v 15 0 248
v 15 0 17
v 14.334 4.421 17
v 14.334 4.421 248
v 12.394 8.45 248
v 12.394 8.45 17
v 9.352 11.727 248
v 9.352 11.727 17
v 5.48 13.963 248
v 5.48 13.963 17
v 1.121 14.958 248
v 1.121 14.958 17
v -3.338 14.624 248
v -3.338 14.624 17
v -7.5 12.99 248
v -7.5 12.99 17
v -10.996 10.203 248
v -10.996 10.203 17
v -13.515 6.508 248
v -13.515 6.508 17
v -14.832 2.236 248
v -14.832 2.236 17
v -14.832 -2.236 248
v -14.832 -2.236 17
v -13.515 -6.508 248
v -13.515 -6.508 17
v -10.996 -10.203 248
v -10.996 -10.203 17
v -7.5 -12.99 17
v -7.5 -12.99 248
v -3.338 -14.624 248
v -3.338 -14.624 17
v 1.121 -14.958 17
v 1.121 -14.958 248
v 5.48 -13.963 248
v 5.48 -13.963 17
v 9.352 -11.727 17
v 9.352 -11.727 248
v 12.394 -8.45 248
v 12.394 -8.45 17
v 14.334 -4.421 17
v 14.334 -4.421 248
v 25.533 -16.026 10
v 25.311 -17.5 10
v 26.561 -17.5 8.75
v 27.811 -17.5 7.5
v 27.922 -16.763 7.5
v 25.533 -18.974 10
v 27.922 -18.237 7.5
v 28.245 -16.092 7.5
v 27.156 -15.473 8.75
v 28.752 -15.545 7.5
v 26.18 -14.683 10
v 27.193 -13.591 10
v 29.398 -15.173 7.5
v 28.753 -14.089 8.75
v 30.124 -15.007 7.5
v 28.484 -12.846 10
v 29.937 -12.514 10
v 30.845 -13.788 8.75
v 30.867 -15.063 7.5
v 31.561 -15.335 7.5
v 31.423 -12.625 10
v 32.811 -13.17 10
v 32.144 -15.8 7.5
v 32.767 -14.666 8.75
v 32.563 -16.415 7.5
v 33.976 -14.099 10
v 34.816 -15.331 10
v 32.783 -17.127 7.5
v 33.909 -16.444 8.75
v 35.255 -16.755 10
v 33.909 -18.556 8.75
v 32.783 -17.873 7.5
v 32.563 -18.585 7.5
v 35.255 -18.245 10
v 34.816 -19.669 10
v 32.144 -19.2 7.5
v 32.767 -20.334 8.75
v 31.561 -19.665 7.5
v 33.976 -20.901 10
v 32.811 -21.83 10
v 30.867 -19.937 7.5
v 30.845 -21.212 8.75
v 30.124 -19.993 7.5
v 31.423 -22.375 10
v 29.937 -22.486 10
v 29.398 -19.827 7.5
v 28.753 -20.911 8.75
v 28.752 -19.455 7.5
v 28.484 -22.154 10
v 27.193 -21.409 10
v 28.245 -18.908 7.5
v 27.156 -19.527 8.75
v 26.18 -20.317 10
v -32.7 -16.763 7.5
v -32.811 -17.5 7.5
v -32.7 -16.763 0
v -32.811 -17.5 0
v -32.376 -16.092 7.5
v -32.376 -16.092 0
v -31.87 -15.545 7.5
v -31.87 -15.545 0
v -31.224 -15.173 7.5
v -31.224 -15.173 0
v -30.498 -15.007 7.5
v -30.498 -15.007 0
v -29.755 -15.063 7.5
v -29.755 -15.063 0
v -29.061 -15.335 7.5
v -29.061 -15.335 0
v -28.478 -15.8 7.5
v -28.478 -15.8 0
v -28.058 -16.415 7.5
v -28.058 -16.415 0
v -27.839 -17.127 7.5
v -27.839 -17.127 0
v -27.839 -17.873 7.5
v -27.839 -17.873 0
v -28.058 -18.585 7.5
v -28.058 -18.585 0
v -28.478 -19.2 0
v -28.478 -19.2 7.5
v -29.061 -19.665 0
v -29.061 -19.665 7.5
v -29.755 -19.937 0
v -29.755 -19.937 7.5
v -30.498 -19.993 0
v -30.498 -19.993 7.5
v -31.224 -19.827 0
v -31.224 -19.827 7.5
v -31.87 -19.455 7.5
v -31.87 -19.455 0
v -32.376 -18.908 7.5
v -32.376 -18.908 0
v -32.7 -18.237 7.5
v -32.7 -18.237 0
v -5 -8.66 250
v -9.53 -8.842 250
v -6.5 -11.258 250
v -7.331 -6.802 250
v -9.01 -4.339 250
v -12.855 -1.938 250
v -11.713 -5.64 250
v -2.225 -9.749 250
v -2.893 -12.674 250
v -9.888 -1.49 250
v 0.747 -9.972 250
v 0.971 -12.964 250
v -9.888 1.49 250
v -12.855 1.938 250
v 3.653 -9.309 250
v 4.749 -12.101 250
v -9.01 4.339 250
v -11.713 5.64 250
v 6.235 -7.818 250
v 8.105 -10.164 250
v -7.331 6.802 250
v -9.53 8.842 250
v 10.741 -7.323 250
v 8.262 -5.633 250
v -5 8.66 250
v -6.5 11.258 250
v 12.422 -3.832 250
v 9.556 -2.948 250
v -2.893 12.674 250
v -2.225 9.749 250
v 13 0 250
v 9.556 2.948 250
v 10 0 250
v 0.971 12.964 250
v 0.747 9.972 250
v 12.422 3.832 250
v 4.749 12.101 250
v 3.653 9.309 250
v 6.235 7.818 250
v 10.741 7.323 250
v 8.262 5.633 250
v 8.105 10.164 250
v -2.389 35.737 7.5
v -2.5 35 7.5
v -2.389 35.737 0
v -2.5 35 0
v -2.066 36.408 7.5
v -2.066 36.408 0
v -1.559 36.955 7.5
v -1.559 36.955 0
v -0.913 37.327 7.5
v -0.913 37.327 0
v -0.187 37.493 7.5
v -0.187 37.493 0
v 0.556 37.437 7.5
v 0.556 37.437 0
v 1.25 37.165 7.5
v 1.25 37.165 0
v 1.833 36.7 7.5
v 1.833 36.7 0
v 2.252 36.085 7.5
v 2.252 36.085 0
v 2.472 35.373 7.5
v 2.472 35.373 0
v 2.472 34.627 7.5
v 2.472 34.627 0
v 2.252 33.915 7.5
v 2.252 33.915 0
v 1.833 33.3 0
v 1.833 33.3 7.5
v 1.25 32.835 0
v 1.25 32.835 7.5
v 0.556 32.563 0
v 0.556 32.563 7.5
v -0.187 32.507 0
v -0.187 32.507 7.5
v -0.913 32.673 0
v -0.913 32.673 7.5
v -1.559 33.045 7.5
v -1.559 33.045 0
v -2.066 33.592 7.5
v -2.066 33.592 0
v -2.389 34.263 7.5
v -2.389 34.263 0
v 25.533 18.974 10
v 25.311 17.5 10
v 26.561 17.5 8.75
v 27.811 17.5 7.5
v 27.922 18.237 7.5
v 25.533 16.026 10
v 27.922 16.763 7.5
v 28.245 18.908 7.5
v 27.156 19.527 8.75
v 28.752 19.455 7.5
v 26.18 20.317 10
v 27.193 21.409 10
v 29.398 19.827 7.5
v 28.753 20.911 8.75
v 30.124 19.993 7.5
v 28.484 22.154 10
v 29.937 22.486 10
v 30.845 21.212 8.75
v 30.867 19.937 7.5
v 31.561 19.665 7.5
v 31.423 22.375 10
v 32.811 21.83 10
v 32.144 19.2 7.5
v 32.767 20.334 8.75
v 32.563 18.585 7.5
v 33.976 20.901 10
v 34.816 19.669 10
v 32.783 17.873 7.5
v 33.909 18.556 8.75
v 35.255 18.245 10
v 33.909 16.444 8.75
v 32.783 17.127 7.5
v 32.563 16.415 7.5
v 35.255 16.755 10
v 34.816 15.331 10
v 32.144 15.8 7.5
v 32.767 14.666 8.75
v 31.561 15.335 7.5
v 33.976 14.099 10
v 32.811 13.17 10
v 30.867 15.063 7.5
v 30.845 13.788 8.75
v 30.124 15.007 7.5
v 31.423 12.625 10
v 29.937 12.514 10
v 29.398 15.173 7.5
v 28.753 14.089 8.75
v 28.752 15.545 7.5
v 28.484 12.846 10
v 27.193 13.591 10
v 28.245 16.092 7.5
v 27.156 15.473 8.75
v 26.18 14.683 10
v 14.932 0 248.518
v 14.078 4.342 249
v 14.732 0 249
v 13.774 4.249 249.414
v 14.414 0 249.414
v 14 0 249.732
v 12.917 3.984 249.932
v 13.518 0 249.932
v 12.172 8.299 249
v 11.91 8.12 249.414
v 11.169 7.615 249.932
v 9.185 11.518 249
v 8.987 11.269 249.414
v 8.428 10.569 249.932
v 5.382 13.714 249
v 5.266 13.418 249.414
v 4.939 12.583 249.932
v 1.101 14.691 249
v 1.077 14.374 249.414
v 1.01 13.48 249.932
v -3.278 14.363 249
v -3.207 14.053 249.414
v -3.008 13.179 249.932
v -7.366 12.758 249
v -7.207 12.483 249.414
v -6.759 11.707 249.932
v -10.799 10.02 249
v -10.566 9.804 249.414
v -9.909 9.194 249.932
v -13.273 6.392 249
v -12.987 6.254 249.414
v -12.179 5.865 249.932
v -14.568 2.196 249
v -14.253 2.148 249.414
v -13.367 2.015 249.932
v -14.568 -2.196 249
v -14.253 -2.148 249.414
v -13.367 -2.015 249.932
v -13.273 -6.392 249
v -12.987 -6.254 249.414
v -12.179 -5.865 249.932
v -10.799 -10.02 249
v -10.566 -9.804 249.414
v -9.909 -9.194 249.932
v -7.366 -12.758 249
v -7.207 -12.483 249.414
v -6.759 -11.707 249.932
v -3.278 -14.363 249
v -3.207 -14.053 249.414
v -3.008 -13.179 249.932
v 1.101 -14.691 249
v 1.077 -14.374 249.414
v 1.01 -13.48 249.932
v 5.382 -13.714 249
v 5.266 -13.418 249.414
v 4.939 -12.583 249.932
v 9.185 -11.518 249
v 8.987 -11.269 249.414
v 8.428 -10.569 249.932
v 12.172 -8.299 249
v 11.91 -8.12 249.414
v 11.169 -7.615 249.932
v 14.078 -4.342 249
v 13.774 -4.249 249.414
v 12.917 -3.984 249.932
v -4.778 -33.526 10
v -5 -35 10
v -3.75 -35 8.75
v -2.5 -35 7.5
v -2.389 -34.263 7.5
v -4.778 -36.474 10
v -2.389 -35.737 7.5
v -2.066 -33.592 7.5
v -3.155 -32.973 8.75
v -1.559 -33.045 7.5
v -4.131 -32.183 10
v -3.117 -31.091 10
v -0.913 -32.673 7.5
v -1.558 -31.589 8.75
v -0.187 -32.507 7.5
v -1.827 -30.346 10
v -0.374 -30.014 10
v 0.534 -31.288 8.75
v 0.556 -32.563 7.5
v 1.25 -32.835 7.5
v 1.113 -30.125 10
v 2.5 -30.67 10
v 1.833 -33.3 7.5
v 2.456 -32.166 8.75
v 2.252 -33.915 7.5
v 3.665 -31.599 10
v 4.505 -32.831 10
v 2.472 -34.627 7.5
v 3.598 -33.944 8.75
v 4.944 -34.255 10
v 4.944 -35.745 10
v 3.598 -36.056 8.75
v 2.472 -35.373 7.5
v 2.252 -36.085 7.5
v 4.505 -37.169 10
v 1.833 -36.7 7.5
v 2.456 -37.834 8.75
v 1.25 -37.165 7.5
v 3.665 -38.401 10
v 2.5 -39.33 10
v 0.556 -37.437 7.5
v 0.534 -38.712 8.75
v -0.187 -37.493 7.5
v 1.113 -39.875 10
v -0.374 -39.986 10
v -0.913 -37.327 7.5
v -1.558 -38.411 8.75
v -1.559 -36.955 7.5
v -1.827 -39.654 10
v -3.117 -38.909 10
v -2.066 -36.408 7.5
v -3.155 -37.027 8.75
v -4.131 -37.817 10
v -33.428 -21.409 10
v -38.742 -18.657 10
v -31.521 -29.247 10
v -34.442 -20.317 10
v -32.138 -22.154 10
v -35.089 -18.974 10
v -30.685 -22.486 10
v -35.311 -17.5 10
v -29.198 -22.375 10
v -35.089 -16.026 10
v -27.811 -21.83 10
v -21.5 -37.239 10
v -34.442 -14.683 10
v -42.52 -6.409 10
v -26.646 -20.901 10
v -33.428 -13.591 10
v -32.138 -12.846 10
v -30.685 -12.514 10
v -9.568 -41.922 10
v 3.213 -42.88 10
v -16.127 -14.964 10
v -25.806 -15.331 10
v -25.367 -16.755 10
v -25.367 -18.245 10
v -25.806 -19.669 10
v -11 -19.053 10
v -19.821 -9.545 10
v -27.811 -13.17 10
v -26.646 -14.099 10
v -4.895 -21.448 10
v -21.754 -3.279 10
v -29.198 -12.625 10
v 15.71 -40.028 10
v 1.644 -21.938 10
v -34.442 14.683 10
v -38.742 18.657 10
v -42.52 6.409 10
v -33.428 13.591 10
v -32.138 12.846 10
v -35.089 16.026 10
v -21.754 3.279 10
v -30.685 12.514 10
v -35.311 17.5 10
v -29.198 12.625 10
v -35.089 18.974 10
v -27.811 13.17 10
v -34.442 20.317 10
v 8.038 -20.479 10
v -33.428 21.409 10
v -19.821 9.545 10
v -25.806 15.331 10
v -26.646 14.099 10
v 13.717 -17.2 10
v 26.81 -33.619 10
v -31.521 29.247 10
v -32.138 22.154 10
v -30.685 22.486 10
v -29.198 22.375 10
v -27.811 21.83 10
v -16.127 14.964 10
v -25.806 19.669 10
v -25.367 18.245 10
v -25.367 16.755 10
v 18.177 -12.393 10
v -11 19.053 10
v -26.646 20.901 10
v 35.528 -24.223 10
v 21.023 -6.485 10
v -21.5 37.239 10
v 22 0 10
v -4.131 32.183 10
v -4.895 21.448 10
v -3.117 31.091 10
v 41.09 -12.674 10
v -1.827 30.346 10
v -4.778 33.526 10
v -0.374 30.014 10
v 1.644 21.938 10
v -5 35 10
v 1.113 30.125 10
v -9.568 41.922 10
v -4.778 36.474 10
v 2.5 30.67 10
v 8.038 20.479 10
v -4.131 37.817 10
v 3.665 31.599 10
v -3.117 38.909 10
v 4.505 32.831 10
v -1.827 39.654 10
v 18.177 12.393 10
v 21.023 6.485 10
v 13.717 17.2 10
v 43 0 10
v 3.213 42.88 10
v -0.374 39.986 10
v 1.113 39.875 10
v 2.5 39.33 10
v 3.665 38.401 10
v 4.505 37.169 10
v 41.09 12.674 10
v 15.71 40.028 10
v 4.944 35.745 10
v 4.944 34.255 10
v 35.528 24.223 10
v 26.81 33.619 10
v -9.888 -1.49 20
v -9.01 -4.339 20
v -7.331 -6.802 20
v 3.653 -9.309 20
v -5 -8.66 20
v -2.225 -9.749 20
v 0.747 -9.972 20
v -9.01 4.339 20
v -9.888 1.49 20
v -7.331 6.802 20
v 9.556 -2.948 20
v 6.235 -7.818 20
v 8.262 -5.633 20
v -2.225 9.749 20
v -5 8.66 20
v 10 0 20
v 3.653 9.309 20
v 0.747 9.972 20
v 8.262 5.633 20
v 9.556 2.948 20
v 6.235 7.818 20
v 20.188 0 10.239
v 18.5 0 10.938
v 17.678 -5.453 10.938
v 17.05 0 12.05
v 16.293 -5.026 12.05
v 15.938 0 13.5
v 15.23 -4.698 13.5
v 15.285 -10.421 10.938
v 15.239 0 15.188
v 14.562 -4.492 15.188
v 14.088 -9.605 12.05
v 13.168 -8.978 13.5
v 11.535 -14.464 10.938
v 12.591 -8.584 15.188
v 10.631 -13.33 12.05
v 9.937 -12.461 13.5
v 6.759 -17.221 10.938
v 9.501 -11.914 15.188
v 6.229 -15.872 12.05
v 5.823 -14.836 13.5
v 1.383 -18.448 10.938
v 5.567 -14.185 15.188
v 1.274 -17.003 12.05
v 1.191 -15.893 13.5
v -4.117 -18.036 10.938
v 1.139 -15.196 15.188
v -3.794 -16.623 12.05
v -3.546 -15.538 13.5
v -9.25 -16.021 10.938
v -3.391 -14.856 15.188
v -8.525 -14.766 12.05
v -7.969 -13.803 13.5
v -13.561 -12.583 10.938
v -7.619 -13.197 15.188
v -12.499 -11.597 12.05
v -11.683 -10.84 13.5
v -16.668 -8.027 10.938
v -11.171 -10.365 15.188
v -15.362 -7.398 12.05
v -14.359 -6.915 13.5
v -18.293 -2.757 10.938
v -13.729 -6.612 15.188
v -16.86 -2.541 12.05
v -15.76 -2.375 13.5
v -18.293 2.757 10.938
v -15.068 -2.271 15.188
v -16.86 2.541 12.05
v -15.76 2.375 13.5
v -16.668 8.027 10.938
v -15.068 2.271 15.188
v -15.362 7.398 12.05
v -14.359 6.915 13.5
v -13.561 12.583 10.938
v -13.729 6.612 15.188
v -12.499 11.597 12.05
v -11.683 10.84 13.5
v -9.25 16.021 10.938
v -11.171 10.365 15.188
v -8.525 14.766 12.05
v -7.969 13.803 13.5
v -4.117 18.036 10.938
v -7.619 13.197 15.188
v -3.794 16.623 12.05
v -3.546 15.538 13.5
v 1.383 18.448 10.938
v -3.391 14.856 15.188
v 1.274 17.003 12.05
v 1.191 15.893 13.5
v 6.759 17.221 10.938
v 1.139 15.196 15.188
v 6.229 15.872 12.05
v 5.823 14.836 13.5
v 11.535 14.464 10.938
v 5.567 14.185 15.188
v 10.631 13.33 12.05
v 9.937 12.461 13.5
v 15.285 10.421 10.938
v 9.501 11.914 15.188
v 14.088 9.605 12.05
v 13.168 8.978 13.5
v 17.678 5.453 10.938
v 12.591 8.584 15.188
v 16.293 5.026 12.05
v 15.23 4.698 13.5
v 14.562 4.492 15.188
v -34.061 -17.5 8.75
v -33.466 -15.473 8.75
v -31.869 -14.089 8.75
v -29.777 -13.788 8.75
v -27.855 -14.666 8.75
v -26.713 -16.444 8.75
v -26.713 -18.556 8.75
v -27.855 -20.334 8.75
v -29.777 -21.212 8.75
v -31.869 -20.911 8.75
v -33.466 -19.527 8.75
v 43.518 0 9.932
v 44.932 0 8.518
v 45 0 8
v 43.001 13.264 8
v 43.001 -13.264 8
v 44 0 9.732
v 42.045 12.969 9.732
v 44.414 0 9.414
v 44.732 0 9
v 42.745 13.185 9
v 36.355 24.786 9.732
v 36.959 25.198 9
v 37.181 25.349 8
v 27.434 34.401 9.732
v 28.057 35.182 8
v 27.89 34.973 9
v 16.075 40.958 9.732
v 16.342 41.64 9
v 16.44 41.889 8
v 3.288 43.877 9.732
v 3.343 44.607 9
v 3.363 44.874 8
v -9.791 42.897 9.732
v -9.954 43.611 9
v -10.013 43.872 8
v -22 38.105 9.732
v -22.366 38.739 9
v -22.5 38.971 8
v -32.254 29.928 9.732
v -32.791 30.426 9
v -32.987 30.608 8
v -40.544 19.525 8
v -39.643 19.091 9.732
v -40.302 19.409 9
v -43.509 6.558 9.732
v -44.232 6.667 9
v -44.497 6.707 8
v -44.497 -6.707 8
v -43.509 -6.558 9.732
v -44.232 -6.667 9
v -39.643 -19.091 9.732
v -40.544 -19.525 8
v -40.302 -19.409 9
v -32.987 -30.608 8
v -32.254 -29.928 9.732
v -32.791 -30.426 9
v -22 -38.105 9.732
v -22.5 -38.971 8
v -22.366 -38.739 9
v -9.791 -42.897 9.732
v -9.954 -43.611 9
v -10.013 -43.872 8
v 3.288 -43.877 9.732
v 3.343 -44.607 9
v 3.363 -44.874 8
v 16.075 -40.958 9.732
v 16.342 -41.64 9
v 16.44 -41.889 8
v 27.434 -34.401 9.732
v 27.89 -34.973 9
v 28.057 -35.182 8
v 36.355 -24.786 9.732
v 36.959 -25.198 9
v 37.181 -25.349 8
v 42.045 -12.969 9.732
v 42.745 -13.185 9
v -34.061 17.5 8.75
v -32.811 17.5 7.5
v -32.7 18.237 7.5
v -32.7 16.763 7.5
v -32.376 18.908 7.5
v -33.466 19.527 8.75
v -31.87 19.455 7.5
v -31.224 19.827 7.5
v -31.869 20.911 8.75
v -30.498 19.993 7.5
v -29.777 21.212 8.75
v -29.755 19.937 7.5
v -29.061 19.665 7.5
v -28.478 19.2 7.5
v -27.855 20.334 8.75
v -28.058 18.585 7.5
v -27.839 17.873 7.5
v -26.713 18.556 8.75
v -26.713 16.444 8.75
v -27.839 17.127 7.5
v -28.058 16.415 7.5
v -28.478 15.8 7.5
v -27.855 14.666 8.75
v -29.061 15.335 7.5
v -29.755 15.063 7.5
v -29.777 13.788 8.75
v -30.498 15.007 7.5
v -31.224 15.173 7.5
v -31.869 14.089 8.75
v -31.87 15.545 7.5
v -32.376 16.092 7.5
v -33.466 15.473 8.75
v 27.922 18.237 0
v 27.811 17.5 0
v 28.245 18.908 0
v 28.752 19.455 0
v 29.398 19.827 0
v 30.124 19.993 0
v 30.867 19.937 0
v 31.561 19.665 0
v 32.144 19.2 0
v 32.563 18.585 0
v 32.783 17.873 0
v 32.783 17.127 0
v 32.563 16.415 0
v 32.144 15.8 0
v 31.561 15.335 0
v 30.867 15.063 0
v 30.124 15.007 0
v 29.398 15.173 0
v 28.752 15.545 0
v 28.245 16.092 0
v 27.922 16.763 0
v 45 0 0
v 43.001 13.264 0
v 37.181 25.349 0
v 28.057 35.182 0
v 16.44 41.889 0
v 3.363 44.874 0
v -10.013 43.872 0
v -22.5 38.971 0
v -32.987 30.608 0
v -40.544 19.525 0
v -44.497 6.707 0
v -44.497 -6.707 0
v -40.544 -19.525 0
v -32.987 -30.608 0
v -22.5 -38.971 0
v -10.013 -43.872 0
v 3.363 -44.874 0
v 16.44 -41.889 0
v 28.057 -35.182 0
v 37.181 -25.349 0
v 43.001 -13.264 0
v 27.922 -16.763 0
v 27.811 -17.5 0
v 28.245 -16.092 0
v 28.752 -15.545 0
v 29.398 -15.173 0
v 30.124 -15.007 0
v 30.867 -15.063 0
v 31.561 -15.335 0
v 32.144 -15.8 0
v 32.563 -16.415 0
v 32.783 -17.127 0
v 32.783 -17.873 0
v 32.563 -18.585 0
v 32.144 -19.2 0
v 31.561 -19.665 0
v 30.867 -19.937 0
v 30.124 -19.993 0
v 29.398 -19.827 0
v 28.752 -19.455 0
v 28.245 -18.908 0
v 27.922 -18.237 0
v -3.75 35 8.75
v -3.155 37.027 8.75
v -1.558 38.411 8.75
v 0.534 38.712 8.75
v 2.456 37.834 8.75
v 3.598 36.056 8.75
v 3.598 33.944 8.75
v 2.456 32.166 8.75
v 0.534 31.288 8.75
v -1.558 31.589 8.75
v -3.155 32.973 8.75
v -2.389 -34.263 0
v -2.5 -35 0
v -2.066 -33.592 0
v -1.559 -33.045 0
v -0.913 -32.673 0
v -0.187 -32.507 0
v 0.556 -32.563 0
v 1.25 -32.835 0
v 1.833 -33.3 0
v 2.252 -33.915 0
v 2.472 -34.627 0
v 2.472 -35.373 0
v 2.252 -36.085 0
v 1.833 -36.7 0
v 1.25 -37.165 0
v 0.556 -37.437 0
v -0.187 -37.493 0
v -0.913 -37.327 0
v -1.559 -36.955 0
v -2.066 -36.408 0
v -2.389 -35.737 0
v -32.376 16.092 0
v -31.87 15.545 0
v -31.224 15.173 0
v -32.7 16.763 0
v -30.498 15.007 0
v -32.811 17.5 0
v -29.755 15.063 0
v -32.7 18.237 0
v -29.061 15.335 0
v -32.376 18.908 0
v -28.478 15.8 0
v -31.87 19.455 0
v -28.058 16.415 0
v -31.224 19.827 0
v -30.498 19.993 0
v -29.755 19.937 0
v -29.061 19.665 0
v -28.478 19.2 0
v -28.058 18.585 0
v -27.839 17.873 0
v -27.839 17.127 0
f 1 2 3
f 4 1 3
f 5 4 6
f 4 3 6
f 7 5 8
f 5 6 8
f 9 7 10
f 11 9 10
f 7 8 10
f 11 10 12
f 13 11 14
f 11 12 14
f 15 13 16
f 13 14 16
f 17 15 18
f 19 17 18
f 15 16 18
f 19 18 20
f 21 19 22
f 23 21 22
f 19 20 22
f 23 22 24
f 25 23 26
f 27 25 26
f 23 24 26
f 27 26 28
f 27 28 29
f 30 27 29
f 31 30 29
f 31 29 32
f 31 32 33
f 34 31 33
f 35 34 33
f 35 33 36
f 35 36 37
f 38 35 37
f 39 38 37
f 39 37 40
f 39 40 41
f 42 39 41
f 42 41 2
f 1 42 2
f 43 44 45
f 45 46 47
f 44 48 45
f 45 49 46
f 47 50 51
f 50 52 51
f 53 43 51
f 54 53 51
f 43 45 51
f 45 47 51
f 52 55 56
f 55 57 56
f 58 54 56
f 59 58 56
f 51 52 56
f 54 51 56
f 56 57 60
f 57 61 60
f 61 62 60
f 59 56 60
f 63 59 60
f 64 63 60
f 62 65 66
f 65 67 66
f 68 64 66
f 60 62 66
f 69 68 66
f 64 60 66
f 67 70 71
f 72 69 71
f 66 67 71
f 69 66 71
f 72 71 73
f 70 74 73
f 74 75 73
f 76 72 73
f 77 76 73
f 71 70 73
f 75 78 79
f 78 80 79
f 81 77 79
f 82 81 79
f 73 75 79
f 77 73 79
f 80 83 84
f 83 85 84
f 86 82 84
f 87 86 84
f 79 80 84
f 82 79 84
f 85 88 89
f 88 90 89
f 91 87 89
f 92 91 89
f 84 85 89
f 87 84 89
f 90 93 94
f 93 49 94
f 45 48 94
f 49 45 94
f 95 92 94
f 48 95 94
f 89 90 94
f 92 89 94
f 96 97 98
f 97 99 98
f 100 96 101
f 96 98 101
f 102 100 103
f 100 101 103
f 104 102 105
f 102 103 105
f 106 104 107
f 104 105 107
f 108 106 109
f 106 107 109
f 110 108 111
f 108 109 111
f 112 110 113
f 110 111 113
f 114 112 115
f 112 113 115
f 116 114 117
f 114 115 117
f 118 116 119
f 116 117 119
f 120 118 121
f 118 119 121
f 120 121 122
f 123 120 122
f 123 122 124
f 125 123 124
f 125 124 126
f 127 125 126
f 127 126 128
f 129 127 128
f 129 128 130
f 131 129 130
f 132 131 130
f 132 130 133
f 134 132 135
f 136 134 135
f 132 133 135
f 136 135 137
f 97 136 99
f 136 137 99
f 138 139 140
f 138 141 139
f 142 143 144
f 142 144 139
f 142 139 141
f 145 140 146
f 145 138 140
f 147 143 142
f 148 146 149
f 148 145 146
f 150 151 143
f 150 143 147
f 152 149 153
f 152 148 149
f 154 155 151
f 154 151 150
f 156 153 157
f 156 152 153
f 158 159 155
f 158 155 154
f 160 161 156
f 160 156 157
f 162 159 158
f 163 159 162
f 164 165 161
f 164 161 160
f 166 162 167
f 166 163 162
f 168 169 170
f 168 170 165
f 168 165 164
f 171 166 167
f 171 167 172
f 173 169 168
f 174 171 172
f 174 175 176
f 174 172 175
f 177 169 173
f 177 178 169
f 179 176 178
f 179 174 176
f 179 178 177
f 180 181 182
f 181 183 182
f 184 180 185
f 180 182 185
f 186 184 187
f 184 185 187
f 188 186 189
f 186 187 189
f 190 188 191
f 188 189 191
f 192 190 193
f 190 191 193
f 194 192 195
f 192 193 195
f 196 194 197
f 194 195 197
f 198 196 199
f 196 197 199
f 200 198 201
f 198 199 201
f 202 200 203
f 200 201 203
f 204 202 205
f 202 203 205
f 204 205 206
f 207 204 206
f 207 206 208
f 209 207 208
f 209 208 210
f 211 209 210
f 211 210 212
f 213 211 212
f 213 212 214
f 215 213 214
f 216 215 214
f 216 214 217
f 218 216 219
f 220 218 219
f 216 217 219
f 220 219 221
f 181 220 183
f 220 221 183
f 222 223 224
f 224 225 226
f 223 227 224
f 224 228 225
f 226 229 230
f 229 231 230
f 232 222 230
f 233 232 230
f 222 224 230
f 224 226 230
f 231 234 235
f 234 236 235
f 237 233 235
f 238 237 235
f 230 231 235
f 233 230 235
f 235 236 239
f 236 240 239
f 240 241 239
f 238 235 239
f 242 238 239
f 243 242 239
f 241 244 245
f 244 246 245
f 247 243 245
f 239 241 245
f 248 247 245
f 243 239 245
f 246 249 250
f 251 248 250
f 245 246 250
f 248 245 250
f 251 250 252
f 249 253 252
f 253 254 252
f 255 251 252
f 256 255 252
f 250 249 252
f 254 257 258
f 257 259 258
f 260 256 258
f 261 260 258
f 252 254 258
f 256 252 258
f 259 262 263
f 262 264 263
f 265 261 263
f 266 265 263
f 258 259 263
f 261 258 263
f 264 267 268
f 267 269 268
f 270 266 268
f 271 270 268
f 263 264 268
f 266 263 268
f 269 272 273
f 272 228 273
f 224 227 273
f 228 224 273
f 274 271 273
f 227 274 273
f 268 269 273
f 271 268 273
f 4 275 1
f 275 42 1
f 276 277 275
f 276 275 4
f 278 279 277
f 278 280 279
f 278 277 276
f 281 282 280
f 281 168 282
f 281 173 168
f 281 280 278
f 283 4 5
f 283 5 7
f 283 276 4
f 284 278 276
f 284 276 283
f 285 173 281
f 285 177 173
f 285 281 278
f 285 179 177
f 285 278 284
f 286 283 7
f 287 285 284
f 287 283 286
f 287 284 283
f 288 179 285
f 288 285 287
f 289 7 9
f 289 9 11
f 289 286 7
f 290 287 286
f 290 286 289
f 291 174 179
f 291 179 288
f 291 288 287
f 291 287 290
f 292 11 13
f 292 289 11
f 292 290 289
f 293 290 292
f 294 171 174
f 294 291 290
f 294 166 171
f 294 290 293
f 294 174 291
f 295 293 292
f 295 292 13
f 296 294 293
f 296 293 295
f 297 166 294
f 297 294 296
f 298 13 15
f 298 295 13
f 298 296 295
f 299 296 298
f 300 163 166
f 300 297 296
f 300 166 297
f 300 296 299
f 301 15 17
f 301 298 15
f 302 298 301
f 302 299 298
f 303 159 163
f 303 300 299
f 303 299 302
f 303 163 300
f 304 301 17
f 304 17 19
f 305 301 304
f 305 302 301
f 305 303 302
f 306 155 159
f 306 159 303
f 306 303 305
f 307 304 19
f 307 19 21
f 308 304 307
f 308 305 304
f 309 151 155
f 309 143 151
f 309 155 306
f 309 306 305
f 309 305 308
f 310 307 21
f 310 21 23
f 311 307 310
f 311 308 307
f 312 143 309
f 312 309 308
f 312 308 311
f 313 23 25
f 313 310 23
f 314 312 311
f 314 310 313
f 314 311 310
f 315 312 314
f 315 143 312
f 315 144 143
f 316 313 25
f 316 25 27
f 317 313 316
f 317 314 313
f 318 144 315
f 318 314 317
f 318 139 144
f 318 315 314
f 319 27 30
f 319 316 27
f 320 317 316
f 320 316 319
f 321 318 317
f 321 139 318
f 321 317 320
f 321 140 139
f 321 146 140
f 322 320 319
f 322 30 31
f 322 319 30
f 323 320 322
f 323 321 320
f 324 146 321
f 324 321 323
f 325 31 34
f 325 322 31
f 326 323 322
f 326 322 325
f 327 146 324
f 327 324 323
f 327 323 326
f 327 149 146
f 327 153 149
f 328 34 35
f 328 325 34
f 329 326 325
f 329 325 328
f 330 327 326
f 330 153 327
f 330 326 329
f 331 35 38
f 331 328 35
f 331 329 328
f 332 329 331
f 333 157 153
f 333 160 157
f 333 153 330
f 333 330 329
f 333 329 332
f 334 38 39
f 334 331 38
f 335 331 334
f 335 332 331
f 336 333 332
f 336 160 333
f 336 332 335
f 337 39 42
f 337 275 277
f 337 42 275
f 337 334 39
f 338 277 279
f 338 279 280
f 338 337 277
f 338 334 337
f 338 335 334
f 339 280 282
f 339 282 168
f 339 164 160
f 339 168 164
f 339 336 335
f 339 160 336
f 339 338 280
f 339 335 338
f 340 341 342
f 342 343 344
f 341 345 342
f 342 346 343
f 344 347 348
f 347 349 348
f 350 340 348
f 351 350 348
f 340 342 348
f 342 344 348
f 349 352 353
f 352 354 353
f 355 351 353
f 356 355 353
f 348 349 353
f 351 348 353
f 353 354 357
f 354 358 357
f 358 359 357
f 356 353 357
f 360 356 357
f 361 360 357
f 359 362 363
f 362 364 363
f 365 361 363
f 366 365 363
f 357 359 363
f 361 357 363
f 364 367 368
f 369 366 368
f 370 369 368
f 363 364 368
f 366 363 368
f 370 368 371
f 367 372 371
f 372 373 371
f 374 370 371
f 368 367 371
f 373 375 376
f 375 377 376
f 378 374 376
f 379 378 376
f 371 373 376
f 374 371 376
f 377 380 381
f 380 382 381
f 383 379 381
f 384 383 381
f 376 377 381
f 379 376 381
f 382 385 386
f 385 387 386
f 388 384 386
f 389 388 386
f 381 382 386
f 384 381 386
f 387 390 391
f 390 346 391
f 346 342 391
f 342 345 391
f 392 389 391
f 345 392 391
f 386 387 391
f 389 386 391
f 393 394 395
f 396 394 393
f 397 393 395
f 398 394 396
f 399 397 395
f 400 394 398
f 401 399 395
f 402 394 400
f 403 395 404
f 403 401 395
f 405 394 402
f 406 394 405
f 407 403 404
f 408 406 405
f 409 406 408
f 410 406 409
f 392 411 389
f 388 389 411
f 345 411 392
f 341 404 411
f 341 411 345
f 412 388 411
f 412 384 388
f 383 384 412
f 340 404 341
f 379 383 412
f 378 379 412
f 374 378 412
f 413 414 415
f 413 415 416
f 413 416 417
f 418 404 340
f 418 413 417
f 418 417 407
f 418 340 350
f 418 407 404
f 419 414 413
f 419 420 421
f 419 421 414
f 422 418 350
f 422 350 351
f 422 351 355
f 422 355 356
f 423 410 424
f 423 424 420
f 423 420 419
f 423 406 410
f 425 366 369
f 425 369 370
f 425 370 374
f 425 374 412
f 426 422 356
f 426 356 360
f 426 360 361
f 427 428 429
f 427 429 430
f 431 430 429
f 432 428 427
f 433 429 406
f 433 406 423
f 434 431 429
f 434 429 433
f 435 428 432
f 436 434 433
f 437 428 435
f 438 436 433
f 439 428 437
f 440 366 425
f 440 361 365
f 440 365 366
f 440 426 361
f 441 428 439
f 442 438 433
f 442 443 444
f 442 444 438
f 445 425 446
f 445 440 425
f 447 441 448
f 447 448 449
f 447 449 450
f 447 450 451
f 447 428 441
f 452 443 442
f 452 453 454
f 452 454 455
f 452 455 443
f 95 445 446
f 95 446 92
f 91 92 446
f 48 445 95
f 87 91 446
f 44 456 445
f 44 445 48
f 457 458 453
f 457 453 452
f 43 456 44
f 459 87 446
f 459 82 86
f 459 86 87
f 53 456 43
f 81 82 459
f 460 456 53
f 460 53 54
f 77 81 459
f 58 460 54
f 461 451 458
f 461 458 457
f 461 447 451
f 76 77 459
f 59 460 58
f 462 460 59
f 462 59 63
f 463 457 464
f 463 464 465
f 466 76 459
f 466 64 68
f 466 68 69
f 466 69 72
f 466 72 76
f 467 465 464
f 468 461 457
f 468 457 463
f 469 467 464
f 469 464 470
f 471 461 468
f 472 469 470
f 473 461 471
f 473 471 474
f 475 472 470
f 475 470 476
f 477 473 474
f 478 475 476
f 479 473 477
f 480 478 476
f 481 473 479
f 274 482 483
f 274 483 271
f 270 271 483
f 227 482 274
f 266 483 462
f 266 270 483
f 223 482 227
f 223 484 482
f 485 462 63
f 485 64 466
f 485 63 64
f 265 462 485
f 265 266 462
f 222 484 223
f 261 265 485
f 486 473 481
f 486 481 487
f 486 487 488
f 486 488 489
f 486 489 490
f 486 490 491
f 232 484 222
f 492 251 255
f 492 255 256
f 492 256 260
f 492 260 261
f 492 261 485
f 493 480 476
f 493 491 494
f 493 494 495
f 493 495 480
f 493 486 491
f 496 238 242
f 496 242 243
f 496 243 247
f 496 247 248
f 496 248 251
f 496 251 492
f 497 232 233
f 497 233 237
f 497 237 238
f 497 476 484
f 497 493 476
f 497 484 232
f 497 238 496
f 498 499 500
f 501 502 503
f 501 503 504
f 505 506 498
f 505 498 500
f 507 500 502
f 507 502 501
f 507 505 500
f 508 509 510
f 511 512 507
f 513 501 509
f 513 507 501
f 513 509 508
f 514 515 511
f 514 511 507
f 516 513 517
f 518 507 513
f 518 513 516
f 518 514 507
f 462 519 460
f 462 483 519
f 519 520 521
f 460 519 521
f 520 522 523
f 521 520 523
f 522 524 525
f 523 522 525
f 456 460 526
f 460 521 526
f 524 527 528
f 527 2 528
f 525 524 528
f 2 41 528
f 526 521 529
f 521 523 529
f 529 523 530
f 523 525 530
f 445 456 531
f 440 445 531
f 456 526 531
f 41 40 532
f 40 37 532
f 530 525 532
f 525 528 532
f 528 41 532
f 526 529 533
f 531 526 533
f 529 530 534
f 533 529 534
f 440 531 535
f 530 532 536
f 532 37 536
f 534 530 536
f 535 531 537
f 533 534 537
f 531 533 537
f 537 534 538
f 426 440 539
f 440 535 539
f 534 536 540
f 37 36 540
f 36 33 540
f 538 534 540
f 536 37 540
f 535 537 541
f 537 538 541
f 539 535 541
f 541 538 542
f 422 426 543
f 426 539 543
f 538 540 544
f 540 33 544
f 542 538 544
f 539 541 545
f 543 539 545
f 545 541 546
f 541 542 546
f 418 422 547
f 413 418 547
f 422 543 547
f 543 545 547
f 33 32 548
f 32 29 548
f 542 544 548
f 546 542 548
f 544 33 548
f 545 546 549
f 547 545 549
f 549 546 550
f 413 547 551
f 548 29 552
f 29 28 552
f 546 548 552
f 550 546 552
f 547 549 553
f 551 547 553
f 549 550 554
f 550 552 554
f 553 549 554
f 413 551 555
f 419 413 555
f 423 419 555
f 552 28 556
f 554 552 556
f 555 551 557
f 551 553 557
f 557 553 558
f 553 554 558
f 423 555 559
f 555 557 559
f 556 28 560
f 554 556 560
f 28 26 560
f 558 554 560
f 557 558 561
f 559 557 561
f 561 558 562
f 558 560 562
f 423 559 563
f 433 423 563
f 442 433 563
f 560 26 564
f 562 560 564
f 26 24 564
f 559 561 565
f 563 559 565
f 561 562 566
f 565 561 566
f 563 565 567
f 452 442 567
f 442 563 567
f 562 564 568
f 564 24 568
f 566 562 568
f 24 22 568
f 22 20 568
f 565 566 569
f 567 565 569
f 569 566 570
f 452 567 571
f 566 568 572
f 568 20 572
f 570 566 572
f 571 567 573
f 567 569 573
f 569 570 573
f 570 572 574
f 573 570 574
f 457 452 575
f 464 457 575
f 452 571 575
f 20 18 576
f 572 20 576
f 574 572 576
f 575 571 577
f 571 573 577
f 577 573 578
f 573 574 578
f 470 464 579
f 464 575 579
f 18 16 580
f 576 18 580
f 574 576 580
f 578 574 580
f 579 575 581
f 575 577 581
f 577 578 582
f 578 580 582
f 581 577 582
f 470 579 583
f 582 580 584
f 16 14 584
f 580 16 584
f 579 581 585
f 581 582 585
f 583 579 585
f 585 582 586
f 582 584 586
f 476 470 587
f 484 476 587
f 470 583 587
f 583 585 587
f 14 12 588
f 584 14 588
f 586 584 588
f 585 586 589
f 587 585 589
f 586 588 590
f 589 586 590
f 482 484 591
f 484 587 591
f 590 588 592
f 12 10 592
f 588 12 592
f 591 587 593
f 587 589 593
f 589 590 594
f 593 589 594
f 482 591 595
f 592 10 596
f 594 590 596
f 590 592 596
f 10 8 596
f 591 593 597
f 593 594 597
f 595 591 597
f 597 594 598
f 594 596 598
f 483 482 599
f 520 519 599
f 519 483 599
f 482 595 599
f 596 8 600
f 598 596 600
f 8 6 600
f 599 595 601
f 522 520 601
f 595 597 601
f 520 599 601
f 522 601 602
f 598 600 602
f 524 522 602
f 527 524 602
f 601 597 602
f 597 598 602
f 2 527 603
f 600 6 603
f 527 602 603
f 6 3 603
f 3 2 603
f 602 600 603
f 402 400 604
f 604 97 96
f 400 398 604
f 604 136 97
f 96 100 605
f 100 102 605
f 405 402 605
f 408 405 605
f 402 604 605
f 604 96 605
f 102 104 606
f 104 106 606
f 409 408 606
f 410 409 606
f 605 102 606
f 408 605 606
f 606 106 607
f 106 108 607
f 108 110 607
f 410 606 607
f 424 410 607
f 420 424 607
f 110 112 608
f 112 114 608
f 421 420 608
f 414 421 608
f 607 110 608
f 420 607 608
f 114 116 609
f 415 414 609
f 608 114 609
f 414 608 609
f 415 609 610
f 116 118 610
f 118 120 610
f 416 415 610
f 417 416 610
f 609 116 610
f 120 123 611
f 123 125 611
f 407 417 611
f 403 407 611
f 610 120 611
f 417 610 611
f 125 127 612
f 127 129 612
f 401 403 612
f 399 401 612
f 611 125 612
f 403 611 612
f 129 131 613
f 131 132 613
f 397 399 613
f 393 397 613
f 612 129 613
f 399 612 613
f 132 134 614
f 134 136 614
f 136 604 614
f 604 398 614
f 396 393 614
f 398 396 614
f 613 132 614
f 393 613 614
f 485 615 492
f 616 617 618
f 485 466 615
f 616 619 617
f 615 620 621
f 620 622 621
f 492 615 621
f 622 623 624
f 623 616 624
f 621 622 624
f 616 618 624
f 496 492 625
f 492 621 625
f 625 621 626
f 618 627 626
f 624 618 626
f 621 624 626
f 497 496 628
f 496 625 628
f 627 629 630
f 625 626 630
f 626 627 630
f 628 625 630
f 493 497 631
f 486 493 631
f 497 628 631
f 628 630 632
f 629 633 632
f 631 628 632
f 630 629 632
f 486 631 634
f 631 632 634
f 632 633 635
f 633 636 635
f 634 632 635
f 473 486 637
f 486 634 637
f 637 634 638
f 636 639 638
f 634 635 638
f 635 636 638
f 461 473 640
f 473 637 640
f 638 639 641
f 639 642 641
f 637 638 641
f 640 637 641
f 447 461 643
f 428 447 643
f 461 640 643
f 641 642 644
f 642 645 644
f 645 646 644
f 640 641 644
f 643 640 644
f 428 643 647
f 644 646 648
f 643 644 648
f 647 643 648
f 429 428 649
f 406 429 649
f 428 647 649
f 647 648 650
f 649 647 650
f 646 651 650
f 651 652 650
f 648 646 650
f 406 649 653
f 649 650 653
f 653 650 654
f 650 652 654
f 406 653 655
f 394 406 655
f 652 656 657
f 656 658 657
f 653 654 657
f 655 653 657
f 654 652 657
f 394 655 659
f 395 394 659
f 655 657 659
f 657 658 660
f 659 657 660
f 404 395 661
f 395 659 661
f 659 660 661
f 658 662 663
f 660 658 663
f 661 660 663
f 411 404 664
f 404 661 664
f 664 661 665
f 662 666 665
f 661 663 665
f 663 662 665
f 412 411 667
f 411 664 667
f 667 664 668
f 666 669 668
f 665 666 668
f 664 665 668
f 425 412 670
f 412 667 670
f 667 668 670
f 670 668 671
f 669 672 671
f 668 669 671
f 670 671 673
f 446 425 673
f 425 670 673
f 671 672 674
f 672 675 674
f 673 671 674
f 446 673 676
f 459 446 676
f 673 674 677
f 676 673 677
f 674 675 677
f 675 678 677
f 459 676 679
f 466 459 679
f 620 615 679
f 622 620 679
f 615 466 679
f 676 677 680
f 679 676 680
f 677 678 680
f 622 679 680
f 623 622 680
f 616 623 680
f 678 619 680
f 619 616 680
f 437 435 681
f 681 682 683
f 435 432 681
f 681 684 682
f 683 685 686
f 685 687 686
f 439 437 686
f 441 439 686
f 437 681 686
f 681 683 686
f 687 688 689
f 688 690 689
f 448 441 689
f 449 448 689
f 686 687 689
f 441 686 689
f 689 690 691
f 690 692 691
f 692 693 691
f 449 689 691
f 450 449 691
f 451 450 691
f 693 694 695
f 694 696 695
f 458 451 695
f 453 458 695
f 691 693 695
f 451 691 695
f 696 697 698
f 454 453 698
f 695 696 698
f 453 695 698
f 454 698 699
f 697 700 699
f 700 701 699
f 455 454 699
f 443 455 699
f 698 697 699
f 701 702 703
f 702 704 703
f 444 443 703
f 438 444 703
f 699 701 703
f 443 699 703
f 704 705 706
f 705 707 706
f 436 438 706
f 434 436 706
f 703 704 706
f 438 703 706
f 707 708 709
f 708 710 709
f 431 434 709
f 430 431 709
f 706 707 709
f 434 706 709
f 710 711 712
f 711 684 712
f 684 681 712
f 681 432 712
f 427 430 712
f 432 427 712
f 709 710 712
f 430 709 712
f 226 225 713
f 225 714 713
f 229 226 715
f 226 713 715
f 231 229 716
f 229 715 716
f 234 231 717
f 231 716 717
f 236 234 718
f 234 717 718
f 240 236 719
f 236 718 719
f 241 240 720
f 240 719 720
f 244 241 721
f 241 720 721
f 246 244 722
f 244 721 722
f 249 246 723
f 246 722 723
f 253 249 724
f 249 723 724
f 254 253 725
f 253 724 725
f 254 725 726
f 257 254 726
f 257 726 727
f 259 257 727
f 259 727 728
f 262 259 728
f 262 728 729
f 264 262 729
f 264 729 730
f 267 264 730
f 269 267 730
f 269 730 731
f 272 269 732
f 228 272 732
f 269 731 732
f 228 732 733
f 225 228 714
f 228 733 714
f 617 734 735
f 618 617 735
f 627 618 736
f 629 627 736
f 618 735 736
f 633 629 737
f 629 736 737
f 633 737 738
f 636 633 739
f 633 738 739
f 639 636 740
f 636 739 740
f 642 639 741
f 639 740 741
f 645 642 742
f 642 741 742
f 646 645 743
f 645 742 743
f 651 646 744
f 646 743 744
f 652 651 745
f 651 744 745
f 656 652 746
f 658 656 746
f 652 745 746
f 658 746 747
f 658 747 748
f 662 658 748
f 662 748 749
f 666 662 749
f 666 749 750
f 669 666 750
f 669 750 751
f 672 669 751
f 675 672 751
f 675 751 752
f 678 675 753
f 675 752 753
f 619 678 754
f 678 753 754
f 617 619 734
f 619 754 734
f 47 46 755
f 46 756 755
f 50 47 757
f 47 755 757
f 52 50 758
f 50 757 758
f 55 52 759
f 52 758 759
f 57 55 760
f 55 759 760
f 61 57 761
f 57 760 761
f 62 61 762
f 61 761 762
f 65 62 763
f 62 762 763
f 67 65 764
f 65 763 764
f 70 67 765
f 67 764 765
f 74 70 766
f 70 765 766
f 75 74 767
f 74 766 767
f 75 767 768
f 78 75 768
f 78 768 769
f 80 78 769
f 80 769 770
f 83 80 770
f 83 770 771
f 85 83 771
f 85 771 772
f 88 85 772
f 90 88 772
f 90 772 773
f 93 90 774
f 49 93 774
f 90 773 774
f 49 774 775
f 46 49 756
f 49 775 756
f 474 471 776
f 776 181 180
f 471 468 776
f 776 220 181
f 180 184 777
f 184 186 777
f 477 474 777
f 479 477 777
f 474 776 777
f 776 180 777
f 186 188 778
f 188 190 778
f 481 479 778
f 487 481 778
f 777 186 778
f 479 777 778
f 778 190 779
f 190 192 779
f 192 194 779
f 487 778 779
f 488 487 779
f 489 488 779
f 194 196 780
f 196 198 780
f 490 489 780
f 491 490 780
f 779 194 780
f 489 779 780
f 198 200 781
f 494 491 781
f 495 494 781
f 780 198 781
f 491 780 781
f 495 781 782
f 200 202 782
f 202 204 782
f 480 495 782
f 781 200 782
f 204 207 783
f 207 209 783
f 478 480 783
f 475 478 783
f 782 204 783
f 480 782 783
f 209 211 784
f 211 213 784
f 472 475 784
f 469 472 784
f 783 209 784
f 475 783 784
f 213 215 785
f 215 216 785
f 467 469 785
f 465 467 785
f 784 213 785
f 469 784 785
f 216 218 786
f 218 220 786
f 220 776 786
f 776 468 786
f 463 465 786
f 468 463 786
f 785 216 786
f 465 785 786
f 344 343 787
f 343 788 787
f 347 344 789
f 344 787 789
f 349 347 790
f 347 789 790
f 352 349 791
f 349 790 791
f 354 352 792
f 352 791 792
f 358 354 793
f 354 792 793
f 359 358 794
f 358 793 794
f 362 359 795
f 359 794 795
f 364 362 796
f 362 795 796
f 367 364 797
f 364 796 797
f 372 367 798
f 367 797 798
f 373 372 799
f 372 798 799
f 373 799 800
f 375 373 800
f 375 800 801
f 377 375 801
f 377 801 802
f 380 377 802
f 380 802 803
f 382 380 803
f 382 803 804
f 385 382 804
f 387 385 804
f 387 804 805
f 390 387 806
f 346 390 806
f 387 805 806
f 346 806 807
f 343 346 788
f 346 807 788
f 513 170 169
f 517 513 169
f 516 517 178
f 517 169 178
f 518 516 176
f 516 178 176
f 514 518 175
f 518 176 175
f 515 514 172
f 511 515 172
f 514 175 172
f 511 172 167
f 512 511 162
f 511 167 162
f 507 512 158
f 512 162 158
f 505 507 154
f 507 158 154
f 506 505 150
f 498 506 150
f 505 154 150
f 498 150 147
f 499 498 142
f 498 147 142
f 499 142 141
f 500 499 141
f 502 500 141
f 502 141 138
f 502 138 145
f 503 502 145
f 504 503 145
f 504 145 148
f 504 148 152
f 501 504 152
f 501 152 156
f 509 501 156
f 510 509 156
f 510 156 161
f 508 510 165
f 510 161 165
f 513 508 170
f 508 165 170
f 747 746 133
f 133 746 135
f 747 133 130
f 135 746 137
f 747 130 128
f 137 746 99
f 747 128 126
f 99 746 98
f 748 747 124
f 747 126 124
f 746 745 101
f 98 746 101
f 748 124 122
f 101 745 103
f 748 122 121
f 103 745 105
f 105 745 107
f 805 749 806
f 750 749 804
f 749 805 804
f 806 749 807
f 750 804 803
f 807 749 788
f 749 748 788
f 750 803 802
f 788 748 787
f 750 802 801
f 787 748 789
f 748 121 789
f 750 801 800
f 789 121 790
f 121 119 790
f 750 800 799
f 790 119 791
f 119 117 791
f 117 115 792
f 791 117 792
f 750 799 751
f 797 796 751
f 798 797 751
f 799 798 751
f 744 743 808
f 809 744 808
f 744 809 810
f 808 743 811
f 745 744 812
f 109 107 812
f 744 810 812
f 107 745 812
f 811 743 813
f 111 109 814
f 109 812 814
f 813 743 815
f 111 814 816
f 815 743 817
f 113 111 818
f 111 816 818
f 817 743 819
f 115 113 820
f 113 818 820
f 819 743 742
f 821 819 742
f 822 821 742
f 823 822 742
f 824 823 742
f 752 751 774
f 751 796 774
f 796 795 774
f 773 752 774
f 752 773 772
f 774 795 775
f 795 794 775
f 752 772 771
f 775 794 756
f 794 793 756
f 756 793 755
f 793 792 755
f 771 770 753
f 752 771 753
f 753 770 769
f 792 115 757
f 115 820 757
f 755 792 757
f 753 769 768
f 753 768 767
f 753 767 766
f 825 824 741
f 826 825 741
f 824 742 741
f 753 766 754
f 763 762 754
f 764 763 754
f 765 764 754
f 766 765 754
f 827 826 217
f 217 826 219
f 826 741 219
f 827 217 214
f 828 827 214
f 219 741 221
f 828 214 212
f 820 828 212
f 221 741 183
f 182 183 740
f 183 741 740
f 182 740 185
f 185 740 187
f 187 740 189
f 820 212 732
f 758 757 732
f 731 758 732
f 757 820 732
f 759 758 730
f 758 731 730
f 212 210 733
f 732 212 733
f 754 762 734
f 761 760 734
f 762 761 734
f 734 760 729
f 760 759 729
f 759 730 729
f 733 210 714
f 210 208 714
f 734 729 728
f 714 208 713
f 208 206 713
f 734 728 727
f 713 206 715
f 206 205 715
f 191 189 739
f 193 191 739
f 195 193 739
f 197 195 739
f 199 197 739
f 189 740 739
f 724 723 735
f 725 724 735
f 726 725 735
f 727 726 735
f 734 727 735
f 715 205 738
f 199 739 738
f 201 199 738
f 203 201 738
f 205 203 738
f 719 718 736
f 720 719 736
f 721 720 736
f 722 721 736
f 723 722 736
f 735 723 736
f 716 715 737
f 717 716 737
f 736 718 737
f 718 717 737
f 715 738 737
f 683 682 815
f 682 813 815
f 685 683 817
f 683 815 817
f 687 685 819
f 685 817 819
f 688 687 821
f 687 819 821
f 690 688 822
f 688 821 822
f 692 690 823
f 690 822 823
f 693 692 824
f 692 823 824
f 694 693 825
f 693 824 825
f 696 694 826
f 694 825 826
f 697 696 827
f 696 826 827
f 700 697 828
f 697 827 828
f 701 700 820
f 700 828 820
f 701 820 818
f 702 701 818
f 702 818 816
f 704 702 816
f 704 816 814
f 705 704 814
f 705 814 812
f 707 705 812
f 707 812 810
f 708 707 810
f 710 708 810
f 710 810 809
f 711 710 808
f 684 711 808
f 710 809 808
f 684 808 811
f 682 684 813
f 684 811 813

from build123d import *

# Parameters (mm, degrees)
F0_R           = 45
F1_DEPTH       = 10
F2_R           = 15
F3_DEPTH       = 250
F5_D           = 5
F5_CSINK_D     = 10
F5_CSINK_ANGLE = 90
F6_R           = 7
F7_R           = 2
F8_R           = 2
F10_R          = 10
F11_DEPTH      = 230


with BuildPart() as f1:
    # F0 (on Top) → F1 (new body)
    with BuildSketch(Plane.XY):
        Circle(F0_R)
    extrude(amount=F1_DEPTH)

    # F2 (on Top) → F3 (join)
    with BuildSketch(Plane.XY):
        Circle(F2_R)
    extrude(amount=F3_DEPTH)

    # F5 (through all)
    with Locations(Plane.XY.offset(10)):
        with Locations((0, 35), (-30.310889, 17.5), (-30.310889, -17.5), (0, -35), (30.310889, -17.5), (30.310889, 17.5)):
            CounterSinkHole(F5_D / 2, F5_CSINK_D / 2, counter_sink_angle=F5_CSINK_ANGLE)

    # F6
    f6_edges = [f1.edges().sort_by_distance(p)[0] for p in [
        (-15, 0, 10),
    ]]
    fillet(f6_edges, radius=F6_R)

    # F7
    f7_edges = [f1.edges().sort_by_distance(p)[0] for p in [
        (-15, 0, 250),
    ]]
    fillet(f7_edges, radius=F7_R)

    # F8
    f8_edges = [f1.edges().sort_by_distance(p)[0] for p in [
        (-45, 0, 10),
    ]]
    fillet(f8_edges, radius=F8_R)

    # F10 (on face) → F11 (cut)
    with BuildSketch(Plane.XY.offset(250)):
        Circle(F10_R)
    extrude(amount=-F11_DEPTH, mode=Mode.SUBTRACT)


solid = f1.part
